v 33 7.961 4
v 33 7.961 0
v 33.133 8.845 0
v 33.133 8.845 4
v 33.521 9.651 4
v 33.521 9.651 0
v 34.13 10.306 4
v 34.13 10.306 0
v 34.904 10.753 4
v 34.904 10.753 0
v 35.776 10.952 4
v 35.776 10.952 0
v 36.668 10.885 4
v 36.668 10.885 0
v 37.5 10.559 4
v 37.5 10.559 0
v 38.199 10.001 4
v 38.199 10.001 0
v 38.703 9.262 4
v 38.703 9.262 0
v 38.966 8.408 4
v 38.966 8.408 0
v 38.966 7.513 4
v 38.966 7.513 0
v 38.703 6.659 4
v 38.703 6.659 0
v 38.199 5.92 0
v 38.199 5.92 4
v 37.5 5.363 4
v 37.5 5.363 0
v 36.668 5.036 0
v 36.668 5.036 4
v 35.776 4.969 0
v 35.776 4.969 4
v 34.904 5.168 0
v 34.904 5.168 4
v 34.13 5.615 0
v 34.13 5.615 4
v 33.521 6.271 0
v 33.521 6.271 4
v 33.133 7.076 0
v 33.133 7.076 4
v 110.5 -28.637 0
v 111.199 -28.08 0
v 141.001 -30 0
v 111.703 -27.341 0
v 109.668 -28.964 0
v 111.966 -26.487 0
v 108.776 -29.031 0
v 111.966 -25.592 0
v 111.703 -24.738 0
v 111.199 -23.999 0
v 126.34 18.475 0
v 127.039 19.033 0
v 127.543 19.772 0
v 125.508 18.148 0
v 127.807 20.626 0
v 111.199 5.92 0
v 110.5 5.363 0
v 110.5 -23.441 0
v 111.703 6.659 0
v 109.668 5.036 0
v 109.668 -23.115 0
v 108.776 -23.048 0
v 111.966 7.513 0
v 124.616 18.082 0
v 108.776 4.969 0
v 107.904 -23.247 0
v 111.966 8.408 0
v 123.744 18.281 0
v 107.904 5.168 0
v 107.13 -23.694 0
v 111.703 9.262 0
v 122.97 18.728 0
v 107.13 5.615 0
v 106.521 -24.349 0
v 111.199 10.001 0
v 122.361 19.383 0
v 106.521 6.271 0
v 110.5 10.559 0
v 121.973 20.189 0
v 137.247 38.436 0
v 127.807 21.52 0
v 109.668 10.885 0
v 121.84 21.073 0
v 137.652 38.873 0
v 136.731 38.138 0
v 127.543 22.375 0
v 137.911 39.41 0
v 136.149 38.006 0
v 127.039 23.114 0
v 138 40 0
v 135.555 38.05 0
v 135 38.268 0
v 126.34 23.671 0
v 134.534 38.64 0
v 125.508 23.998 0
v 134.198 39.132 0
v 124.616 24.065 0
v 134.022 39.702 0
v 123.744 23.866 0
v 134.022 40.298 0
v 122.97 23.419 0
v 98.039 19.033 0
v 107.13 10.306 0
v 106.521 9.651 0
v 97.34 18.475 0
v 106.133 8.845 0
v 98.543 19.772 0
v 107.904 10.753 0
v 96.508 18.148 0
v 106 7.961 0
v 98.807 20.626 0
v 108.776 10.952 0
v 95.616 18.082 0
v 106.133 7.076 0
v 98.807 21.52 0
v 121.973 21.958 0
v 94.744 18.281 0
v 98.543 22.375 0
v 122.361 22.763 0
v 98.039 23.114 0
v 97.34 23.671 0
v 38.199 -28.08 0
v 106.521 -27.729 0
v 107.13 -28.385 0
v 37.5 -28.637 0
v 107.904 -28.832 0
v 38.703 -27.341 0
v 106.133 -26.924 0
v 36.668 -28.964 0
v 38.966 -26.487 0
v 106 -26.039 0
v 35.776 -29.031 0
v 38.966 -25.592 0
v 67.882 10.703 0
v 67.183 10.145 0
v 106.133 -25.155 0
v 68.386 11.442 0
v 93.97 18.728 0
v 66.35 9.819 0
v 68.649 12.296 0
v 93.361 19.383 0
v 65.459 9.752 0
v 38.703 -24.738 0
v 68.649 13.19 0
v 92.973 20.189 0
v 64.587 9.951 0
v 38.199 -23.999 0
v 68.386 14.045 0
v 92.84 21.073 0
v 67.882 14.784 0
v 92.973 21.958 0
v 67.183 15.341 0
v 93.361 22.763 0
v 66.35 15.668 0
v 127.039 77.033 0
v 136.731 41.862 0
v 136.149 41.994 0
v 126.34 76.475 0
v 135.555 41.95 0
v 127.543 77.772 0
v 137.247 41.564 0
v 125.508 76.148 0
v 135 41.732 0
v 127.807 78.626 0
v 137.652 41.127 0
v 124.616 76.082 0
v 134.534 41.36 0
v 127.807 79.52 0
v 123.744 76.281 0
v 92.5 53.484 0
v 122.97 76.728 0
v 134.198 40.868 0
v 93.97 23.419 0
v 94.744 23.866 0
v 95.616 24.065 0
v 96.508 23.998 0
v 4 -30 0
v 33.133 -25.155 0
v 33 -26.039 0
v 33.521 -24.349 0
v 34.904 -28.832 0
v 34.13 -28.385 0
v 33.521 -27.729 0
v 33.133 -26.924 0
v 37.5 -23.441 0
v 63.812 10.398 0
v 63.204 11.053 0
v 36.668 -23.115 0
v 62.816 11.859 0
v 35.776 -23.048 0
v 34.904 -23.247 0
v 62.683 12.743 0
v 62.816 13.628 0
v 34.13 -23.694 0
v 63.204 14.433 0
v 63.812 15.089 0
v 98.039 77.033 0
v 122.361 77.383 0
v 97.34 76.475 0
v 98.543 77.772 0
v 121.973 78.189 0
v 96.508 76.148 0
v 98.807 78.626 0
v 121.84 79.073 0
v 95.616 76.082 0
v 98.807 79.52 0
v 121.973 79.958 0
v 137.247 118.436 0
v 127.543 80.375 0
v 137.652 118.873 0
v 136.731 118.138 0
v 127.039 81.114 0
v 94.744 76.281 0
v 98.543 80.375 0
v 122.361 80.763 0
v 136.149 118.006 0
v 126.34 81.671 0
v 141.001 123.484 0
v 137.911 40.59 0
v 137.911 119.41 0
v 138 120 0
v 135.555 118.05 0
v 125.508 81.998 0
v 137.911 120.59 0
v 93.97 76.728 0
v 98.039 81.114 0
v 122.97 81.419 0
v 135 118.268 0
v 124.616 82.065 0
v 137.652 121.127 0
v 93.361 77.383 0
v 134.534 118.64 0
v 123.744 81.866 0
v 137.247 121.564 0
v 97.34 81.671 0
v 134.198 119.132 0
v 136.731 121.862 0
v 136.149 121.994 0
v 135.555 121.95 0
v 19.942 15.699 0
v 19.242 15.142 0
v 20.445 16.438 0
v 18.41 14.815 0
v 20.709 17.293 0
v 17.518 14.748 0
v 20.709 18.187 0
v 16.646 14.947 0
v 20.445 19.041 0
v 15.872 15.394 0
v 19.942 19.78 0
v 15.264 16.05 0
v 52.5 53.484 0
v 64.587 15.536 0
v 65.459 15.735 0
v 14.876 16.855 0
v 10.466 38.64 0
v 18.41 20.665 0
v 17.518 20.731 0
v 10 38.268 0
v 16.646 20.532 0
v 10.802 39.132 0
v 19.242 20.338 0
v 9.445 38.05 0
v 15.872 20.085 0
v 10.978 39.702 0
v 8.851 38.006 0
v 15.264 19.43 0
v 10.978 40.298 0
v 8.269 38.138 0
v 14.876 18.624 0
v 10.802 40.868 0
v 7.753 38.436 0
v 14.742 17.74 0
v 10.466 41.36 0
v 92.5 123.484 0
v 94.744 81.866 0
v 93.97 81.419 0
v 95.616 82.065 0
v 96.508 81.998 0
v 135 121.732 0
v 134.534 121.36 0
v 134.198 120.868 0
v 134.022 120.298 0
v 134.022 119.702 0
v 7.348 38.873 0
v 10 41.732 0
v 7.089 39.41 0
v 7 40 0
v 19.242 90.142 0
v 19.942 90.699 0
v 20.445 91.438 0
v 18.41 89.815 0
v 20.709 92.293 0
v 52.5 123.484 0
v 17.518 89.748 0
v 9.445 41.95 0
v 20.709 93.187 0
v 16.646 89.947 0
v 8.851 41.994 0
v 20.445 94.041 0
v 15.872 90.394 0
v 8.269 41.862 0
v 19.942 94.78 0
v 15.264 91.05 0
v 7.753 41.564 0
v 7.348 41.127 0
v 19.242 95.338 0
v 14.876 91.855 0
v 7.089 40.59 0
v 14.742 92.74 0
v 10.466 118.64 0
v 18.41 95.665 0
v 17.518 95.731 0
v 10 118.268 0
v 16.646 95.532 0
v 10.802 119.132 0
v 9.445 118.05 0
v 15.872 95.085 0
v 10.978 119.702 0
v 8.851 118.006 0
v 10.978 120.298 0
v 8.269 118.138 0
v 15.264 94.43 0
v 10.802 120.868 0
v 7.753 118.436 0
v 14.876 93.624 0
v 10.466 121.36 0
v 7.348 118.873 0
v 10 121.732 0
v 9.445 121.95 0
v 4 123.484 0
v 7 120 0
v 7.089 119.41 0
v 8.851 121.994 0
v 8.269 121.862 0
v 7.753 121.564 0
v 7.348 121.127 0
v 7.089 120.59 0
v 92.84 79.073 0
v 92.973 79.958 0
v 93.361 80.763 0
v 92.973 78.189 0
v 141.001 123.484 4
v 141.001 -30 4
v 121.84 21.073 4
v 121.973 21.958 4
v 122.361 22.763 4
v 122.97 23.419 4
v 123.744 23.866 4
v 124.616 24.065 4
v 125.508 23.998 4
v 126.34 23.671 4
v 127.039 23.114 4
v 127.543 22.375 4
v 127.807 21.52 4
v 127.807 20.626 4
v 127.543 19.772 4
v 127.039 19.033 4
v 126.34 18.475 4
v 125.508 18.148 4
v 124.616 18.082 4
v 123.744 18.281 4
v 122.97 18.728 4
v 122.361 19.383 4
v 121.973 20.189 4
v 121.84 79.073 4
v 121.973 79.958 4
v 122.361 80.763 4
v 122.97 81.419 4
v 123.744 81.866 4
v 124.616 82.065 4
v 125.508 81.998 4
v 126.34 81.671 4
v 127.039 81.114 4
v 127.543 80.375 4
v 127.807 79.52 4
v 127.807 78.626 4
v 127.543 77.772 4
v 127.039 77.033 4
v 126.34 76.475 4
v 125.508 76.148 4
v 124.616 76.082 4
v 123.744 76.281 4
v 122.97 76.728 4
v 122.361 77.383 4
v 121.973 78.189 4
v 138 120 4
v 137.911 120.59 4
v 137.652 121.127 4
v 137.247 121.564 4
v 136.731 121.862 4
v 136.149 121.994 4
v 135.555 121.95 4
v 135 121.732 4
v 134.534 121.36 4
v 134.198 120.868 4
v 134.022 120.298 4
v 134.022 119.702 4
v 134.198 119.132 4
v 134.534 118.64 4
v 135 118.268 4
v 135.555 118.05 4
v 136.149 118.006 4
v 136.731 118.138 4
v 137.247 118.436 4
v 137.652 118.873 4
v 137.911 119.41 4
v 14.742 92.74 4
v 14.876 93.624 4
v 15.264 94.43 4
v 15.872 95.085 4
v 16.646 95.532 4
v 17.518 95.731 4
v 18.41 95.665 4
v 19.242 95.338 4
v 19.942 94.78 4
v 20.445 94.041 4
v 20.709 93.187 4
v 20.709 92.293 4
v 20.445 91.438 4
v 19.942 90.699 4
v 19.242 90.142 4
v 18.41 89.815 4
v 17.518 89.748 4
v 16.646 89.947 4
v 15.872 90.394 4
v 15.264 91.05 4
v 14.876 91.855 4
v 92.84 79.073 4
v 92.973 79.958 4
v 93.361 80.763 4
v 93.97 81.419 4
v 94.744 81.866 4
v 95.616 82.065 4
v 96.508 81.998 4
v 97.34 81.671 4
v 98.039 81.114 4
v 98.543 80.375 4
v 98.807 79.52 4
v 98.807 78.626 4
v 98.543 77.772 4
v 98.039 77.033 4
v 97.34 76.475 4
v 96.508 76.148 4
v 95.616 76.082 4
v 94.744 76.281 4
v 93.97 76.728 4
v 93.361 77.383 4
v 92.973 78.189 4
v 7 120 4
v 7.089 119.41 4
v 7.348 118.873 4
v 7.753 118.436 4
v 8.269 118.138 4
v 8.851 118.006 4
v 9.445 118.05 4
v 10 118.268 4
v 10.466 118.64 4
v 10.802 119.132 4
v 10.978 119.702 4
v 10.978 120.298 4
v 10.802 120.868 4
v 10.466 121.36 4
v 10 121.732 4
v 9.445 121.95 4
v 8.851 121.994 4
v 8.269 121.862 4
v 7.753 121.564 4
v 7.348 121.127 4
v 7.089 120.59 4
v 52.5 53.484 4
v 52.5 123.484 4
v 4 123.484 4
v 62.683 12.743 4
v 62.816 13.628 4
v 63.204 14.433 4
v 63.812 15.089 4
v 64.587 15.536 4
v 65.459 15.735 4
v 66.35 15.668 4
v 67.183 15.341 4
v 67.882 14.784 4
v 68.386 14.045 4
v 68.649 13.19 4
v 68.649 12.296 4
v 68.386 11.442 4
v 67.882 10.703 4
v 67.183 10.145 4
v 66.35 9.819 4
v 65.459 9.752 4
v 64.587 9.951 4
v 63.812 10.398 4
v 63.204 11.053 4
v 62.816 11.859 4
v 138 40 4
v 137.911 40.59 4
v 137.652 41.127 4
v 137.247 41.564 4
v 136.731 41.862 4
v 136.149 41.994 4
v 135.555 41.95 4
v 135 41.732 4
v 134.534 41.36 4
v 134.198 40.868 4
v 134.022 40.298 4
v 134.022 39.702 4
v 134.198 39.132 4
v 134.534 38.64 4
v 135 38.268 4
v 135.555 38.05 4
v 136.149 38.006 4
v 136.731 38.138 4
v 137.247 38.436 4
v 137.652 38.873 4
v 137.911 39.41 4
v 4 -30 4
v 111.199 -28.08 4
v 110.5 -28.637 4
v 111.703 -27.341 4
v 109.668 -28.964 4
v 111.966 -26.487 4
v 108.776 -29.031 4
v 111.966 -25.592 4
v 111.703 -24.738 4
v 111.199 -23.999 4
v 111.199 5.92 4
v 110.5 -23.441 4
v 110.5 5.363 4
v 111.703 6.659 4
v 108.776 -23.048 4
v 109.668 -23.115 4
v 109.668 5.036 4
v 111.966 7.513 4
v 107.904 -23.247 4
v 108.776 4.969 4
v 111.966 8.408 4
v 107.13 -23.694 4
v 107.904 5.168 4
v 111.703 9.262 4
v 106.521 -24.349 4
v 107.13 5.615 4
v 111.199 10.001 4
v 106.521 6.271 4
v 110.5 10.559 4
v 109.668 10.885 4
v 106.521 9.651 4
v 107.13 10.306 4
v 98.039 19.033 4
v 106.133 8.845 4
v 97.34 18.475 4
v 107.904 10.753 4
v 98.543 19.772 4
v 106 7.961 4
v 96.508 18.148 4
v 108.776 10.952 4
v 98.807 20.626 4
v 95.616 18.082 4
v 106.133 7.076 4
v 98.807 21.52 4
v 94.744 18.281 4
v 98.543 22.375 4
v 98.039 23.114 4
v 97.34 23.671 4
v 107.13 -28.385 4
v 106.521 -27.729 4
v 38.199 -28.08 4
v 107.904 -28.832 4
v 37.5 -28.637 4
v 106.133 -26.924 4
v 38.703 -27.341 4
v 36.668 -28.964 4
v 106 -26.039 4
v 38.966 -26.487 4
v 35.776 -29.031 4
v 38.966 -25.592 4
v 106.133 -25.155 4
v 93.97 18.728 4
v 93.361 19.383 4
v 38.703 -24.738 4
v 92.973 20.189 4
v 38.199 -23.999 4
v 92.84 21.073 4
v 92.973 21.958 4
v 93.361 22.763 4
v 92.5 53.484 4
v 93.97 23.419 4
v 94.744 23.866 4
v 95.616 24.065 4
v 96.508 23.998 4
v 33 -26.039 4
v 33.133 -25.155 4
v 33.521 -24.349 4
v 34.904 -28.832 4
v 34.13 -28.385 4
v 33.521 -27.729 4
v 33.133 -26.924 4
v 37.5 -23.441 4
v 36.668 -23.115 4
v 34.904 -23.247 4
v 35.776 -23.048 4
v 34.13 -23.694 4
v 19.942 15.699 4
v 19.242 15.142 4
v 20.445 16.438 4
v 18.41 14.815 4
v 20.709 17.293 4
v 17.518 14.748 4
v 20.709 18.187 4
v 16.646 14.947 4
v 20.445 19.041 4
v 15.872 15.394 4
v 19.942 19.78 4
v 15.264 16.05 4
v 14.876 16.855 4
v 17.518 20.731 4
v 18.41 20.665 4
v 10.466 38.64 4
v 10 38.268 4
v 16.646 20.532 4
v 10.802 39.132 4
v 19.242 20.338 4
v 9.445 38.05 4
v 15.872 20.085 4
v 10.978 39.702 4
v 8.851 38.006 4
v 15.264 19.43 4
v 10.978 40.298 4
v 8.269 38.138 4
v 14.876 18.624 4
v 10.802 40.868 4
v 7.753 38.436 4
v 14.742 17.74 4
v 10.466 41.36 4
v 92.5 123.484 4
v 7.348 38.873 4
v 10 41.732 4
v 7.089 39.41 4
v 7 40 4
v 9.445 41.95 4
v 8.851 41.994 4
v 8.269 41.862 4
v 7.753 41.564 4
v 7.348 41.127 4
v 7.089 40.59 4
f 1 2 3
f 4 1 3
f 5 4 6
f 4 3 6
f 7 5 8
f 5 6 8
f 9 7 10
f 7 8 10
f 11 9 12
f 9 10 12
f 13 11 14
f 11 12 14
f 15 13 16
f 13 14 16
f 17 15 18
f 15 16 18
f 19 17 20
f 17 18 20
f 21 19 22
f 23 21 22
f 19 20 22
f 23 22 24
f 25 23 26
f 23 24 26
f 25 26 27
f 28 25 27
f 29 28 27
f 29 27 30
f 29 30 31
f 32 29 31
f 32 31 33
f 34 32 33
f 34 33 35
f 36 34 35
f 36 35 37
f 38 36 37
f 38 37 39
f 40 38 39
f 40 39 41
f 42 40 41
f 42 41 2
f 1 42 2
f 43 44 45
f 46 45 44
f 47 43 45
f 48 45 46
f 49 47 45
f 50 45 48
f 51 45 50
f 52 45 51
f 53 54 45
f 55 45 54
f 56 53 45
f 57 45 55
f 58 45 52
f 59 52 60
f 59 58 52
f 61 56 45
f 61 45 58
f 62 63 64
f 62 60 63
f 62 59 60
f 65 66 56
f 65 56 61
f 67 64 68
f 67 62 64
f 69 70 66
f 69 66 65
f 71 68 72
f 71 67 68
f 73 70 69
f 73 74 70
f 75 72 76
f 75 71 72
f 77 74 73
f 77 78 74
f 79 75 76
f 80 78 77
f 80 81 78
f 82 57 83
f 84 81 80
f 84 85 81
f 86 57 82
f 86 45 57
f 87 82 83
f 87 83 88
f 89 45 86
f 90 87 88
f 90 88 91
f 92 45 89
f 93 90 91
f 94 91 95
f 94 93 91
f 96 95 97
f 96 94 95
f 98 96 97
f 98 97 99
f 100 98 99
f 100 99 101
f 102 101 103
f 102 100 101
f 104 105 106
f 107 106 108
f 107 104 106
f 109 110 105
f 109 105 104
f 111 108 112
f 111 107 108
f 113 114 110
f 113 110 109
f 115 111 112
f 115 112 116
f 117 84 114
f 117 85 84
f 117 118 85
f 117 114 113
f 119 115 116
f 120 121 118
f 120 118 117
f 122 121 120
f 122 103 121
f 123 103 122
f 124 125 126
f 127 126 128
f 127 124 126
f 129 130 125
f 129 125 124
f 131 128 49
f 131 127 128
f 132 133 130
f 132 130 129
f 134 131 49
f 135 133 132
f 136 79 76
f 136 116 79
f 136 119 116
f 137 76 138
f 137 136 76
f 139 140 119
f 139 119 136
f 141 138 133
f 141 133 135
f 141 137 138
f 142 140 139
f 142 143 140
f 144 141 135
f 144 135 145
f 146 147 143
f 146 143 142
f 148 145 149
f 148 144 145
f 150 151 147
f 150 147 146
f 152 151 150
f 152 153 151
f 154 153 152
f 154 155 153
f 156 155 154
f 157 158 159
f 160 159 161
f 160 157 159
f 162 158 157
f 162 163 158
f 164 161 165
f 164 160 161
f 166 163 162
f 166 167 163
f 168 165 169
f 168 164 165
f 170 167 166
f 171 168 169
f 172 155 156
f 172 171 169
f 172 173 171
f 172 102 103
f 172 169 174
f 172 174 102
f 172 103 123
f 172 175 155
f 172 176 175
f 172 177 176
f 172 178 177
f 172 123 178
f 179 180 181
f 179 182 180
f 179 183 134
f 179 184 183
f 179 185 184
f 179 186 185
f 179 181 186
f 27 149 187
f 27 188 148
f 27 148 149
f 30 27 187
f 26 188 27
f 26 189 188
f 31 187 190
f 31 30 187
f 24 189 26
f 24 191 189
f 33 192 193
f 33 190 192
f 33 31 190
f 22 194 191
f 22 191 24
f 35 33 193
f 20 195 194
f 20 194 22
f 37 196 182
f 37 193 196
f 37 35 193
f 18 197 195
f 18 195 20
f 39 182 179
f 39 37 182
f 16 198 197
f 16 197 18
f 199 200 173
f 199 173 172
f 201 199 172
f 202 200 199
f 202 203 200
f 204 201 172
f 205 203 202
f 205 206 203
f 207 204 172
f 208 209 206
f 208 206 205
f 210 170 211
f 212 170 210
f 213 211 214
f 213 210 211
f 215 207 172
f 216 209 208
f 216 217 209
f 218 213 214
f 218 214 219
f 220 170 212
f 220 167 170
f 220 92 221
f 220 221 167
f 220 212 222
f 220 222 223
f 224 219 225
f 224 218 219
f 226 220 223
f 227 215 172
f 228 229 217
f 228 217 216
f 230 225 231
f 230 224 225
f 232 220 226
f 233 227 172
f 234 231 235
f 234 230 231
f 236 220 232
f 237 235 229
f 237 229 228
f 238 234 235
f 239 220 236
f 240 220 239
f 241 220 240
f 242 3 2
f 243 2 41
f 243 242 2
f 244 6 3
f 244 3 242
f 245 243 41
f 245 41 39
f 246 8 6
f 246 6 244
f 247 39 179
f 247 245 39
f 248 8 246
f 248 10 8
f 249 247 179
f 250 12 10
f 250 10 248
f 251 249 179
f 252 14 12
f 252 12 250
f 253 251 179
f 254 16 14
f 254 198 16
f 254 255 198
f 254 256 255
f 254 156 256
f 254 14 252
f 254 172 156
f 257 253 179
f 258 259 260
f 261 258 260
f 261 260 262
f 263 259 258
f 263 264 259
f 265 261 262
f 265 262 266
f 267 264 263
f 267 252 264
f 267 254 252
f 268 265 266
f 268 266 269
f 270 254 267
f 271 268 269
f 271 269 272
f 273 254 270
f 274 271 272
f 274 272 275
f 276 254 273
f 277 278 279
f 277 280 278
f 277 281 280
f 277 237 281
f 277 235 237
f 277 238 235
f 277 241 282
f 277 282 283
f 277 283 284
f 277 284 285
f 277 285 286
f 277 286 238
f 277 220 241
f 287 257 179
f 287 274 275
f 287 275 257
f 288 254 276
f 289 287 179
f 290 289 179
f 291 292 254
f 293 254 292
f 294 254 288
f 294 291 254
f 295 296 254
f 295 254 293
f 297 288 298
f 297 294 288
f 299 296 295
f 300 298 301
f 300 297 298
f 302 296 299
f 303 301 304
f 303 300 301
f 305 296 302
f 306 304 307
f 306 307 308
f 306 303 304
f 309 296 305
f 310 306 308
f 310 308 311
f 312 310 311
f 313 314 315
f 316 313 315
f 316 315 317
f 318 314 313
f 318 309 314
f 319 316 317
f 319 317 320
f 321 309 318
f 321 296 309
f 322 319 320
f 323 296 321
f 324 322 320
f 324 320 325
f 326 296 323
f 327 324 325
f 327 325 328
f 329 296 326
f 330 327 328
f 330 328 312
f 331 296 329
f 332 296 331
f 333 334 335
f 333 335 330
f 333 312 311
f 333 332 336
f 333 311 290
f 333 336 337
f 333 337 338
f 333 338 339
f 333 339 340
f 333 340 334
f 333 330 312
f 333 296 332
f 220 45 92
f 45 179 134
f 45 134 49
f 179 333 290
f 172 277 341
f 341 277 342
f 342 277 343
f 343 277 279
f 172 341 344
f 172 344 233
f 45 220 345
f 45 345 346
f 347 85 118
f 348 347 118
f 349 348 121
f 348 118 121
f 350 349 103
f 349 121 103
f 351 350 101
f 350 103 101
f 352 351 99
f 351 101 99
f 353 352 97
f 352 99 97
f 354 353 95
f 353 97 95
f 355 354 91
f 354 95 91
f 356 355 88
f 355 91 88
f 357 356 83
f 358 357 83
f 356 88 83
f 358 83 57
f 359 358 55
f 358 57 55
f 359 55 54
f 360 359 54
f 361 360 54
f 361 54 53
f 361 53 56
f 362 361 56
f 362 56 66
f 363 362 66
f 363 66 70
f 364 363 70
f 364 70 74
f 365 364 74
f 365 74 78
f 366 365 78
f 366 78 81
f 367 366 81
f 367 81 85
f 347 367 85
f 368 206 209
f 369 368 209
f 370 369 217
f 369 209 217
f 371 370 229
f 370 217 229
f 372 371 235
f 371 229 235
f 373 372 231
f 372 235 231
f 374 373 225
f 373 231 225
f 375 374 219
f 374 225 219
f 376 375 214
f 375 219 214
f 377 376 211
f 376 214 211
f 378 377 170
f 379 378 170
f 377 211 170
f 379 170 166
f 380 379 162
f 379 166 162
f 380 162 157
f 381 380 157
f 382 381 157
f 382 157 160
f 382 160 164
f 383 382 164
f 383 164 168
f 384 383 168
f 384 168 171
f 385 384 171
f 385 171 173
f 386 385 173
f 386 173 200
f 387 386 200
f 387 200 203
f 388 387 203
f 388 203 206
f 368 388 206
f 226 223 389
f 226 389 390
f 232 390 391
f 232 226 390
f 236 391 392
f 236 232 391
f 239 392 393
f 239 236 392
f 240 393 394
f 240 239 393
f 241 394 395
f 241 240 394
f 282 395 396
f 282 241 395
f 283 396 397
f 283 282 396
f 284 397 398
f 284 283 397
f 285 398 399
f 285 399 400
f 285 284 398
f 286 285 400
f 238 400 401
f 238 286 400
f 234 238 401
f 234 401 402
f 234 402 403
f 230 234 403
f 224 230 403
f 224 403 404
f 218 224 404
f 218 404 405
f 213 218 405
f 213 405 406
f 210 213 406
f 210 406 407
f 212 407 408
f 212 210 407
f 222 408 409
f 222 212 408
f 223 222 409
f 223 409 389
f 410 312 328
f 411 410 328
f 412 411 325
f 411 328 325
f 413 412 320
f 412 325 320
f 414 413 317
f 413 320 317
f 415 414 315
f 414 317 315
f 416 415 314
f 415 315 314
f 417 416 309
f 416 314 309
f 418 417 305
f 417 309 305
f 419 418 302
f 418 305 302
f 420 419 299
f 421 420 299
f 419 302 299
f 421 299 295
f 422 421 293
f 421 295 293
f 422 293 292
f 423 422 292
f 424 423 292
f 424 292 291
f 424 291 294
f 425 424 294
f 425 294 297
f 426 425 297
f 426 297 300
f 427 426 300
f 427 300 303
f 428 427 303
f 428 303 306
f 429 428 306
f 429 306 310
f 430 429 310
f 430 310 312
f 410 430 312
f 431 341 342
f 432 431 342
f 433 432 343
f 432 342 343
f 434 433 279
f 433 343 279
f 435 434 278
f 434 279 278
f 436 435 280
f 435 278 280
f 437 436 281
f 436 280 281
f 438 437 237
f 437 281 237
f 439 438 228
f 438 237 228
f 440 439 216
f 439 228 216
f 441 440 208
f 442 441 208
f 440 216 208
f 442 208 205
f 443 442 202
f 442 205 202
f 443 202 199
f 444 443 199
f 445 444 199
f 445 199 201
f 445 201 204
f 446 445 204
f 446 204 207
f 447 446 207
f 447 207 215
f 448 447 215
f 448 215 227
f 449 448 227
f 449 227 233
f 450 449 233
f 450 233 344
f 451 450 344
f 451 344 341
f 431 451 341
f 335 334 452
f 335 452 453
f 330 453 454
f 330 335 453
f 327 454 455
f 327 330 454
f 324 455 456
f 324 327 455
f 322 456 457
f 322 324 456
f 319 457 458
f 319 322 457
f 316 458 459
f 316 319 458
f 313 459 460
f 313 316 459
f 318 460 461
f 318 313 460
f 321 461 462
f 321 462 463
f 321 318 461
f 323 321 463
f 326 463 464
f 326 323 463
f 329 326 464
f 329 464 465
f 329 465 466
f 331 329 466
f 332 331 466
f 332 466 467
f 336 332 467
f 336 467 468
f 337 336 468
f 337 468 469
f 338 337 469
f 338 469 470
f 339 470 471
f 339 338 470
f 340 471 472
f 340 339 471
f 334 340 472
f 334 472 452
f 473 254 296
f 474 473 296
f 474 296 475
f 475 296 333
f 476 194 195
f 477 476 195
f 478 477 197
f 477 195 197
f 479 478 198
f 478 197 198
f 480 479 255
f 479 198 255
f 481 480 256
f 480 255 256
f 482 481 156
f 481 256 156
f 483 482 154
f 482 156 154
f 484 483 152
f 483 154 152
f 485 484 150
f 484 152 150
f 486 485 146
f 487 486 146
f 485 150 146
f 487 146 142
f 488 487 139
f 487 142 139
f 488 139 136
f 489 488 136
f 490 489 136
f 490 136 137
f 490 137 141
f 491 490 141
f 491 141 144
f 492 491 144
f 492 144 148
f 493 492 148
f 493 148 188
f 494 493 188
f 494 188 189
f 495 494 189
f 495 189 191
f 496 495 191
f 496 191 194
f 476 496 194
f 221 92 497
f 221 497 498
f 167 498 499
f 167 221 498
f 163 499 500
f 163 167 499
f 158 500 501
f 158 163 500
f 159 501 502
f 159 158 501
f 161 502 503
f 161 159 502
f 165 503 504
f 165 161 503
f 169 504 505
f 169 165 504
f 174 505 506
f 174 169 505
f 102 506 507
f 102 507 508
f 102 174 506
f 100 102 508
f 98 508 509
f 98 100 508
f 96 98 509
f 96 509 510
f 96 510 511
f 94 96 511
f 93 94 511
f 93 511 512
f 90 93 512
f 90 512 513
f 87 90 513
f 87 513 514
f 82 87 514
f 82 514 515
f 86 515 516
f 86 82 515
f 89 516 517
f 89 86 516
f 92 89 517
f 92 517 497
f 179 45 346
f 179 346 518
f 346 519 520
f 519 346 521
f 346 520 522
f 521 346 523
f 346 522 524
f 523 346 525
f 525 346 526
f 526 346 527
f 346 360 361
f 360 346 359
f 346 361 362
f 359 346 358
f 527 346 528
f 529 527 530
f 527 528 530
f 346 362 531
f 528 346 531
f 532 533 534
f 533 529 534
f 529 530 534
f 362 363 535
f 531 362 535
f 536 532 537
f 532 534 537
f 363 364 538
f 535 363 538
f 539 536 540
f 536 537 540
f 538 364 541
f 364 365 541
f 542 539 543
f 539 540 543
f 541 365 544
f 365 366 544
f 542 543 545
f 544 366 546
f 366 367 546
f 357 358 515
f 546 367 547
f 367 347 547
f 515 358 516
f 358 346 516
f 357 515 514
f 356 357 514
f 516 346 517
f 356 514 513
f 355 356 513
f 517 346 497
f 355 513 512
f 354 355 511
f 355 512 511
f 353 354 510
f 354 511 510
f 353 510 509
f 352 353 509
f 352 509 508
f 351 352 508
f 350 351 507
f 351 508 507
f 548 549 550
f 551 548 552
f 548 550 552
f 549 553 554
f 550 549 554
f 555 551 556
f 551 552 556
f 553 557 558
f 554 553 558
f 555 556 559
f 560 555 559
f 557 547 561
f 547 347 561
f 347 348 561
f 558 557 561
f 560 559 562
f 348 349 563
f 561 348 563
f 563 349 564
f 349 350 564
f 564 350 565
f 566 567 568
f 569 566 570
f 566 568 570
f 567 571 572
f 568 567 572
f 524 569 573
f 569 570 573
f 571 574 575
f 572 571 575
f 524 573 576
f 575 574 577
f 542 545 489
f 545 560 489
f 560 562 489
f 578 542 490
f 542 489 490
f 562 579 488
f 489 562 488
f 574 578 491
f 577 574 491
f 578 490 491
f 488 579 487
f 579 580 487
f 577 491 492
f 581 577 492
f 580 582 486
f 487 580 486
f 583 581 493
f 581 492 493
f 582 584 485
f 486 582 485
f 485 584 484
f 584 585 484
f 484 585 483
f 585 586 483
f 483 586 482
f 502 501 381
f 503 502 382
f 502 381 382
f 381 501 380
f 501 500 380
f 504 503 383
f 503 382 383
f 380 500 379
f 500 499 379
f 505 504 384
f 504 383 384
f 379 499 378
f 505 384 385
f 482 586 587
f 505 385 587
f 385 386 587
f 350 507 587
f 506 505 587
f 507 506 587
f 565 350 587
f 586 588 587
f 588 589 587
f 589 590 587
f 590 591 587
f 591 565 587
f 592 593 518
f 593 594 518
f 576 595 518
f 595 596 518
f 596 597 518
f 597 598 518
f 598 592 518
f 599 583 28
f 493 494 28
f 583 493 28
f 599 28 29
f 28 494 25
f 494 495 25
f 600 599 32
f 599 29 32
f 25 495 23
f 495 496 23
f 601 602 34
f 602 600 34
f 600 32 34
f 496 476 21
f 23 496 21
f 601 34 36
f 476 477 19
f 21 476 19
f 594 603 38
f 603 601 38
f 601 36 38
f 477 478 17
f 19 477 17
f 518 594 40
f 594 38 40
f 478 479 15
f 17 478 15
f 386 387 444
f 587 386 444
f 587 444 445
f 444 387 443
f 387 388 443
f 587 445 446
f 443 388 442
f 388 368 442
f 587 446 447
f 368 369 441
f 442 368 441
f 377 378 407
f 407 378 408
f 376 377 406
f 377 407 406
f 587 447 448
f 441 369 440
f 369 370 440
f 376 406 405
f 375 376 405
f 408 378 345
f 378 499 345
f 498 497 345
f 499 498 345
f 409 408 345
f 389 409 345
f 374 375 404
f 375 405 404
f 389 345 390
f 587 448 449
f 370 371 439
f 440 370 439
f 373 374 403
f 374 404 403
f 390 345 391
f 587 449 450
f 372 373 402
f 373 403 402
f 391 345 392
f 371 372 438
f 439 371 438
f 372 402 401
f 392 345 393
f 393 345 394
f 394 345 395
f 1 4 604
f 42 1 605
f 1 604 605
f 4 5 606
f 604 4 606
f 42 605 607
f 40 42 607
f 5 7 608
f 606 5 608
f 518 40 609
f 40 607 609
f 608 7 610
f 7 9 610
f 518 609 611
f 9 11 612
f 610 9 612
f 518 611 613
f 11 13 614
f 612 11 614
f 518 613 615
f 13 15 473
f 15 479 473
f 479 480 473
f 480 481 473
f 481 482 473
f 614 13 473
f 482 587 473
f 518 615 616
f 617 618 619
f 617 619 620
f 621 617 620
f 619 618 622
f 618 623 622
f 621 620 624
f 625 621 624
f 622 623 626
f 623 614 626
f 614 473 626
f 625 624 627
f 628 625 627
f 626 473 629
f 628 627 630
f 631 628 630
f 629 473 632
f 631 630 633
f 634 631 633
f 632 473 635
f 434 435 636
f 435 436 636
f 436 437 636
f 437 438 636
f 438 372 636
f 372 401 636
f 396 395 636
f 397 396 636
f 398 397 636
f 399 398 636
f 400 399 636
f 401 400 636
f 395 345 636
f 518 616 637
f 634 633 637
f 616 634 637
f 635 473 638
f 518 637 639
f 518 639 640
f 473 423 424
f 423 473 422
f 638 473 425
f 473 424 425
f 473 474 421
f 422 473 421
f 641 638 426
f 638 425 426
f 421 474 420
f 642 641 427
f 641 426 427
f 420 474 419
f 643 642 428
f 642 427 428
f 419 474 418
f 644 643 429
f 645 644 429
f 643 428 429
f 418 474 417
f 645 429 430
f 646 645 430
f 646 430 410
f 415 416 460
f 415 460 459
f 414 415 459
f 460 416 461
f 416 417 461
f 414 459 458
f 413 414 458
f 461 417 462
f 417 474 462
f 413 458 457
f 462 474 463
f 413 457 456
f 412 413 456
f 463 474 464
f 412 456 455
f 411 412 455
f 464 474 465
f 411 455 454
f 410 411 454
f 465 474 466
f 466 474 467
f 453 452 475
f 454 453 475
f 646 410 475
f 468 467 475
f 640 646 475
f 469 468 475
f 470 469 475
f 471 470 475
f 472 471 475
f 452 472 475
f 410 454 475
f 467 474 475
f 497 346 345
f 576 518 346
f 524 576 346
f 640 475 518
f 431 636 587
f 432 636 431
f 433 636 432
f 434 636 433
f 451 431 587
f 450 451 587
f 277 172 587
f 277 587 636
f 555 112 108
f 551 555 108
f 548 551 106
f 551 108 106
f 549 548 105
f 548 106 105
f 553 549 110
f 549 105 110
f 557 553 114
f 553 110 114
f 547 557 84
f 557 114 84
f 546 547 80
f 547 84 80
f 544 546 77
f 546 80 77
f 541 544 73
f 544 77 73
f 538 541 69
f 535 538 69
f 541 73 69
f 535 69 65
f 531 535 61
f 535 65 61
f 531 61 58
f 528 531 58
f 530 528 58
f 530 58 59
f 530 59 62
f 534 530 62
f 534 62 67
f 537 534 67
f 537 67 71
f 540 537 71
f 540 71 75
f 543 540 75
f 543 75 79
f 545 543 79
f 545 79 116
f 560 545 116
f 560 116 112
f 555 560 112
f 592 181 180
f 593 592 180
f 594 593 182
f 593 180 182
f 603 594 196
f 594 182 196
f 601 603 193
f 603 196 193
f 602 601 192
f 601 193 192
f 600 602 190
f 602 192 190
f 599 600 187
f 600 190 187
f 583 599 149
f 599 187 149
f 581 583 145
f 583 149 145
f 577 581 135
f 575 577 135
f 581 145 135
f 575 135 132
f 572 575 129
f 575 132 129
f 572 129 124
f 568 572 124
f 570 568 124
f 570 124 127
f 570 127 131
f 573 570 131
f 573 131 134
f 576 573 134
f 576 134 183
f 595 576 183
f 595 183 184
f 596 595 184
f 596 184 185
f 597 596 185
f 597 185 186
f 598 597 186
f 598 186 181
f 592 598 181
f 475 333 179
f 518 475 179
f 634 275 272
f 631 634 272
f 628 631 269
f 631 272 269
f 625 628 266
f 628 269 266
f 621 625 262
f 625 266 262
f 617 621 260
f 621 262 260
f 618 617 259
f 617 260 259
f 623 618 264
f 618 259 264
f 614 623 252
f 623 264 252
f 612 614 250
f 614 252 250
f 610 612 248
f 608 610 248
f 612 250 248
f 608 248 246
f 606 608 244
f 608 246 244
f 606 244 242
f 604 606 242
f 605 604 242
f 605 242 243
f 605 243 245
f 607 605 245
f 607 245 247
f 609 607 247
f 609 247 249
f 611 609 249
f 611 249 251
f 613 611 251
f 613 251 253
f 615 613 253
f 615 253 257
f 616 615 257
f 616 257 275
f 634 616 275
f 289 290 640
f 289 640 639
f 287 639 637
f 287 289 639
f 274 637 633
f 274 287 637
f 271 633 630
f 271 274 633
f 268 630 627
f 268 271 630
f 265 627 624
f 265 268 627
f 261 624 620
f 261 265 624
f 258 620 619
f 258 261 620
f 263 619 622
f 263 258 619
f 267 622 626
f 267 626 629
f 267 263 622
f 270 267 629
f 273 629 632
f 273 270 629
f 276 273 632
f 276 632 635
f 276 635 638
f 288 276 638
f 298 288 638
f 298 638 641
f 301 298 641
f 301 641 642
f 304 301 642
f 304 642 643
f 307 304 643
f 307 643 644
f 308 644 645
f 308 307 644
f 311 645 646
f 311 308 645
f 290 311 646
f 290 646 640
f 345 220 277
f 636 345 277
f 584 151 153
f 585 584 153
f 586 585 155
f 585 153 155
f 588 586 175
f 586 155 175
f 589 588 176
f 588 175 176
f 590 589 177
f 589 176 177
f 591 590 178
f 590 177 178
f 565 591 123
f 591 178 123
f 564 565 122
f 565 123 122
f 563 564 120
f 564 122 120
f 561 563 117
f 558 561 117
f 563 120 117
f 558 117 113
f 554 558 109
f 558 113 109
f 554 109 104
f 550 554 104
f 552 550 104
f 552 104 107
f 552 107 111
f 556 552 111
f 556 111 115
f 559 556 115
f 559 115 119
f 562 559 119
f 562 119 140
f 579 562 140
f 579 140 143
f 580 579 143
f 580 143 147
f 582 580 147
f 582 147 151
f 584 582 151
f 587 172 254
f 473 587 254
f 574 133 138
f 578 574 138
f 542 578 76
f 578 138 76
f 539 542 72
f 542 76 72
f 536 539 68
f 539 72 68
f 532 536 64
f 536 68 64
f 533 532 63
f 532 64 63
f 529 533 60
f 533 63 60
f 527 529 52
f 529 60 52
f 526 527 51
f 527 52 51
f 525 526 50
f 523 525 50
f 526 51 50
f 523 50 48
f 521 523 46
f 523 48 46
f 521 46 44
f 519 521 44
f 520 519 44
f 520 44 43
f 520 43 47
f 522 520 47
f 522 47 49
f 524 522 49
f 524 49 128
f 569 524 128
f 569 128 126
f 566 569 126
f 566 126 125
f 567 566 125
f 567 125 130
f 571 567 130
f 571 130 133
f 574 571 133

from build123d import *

# Parameters (mm, degrees)
SKETCH_1_R          = 2
EXTRUDE_1_DEPTH     = 4
SKETCH_2_R          = 2
CUT_EXTRUDE_1_DEPTH = 26
EXTRUDE_3_DEPTH     = 4
FILLET_1_R          = 4
FILLET_2_R          = 4
SKETCH_5_W          = 10
SKETCH_5_H          = 14
EXTRUDE_4_DEPTH     = 4
FILLET_3_R          = 4
FILLET_1_2_DEPTH    = 4
CUT_EXTRUDE_2_DEPTH = 10
SKETCH_7_R          = 3
CUT_EXTRUDE_3_DEPTH = 10
CUT_EXTRUDE_4_DEPTH = 10
SKETCH_9_W          = 20
SKETCH_9_H          = 70
SKETCH_9_R          = 3
CUT_EXTRUDE_5_DEPTH = 10
CUT_EXTRUDE_6_DEPTH = 10


with BuildPart() as part:
    # 草图1 → 凸台-拉伸1 (new body)
    with BuildSketch(Plane.XY):
        with BuildLine():
            Line((0, -30), (0, 87))
            Line((0, 87), (-8, 87))
            Line((-8, 87), (-8, 95))
            Line((-8, 95), (0, 95))
            Line((0, 95), (0, 155))
            Line((0, 155), (-20, 155))
            Line((-20, 155), (-20, 180))
            Line((-20, 180), (-8, 180))
            ThreePointArc((-8, 180), (-0.928932188, 182.928932188), (2, 190))
            Line((2, 190), (2, 212))
            Line((2, 212), (10, 212))
            Line((10, 212), (10, 190))
            ThreePointArc((10, 190), (12.928932188, 182.928932188), (20, 180))
            Line((20, 180), (72.5, 180))
            Line((72.5, 180), (125, 180))
            ThreePointArc((125, 180), (132.071067812, 182.928932188), (135, 190))
            Line((135, 190), (135, 212))
            Line((135, 212), (143, 212))
            Line((143, 212), (143, 190))
            ThreePointArc((143, 190), (145.928932188, 182.928932188), (153, 180))
            Line((153, 180), (165, 180))
            Line((165, 180), (165, 155))
            Line((165, 155), (145, 155))
            Line((145, 155), (145, 95))
            Line((145, 95), (153, 95))
            Line((153, 95), (153, 87))
            Line((153, 87), (145, 87))
            Line((145, 87), (145, -30))
            Line((145, -30), (0, -30))
        make_face()
        with Locations((139, 208)):
            Circle(SKETCH_1_R, mode=Mode.SUBTRACT)
        with Locations(Location((149, 91, 0), (0, 0, 180))):
            Circle(SKETCH_1_R, mode=Mode.SUBTRACT)
        with Locations(Location((9, 40, 0), (0, 0, 180))):
            Circle(SKETCH_1_R, mode=Mode.SUBTRACT)
        with Locations(Location((9, 120, 0), (0, 0, 180))):
            Circle(SKETCH_1_R, mode=Mode.SUBTRACT)
        with Locations((-4, 91)):
            Circle(SKETCH_1_R, mode=Mode.SUBTRACT)
        with Locations(Location((6, 208, 0), (0, 0, 180))):
            Circle(SKETCH_1_R, mode=Mode.SUBTRACT)
        with Locations((136, 120)):
            Circle(SKETCH_1_R, mode=Mode.SUBTRACT)
        with Locations((136, 40)):
            Circle(SKETCH_1_R, mode=Mode.SUBTRACT)
    extrude(amount=EXTRUDE_1_DEPTH)

    # 草图2 → 切除-拉伸1 (cut)
    with BuildSketch(Plane(origin=(0, 0, 0), x_dir=(-1, 0, 0), z_dir=(0, 0, -1))):
        with Locations((-90.5, 176)):
            Circle(SKETCH_2_R)
        with Locations((-82.5, 176)):
            Circle(SKETCH_2_R)
        with Locations((-62.5, 176)):
            Circle(SKETCH_2_R)
        with Locations((-54.5, 176)):
            Circle(SKETCH_2_R)
    extrude(amount=-CUT_EXTRUDE_1_DEPTH, mode=Mode.SUBTRACT)

    # 草图4 → 凸台-拉伸3 (add)
    with BuildSketch(Plane(origin=(0, 0, 0), x_dir=(-1, 0, 0), z_dir=(0, 0, -1))):
        with BuildLine():
            Line((-102.5, 194), (-102.5, 204.972470671))
            Line((-102.5, 204.972470671), (-99, 215.944941341))
            Line((-99, 215.944941341), (-95.5, 215.944941341))
            ThreePointArc((-95.5, 215.944941341), (-92.121980777, 211.957020041), (-89.03099134, 207.742721229))
            ThreePointArc((-89.03099134, 207.742721229), (-72.5, 199), (-55.96900866, 207.742721229))
            ThreePointArc((-55.96900866, 207.742721229), (-52.878019223, 211.957020041), (-49.5, 215.944941341))
            Line((-49.5, 215.944941341), (-46, 215.944941341))
            Line((-46, 215.944941341), (-42.5, 204.972470671))
            Line((-42.5, 204.972470671), (-42.5, 194))
            Line((-42.5, 194), (-42.5, 180))
            Line((-42.5, 180), (-49.5, 180))
            Line((-49.5, 180), (-49.5, 194))
            Line((-49.5, 194), (-95.5, 194))
            Line((-95.5, 194), (-95.5, 180))
            Line((-95.5, 180), (-102.5, 180))
            Line((-102.5, 180), (-102.5, 194))
        make_face()
    extrude(amount=-EXTRUDE_3_DEPTH)

    # Fillet 1
    fillet_1_edges = [part.edges().sort_by_distance(p)[0] for p in [
        (102.5, 180, 2),
    ]]
    fillet(fillet_1_edges, radius=FILLET_1_R)

    # 圆角2
    fillet_2_edges = [part.edges().sort_by_distance(p)[0] for p in [
        (42.5, 180, 2),
    ]]
    fillet(fillet_2_edges, radius=FILLET_2_R)

    # 草图5 → 凸台-拉伸4 (add)
    with BuildSketch(Plane(origin=(0, 0, 0), x_dir=(-1, 0, 0), z_dir=(0, 0, -1))):
        with Locations((-71.485667886, 187)):
            Rectangle(SKETCH_5_W, SKETCH_5_H)
    extrude(amount=-EXTRUDE_4_DEPTH)

    # 圆角3
    fillet_3_edges = [part.edges().sort_by_distance(p)[0] for p in [
        (0, 95, 2),
    ]]
    fillet(fillet_3_edges, radius=FILLET_3_R)

    # Fillet 1 2: read off the stored shape, not the designer's step
    # Fillet 1 2 outline → Fillet 1 2 (add)
    with BuildSketch(Plane.XY):
        with BuildLine():
            add(Edge.make_bspline(
                [(0, 85), (0, 87), (-2, 87)],
                knots=[0, 0, 0, 1, 1, 1], degree=2, weights=[1, 0.707106781, 1]))
            Line((0, 85), (0, 87))
            Line((0, 87), (-2, 87))
        make_face()
        with BuildLine():
            add(Edge.make_bspline(
                [(145, 97), (145, 95), (147, 95)],
                knots=[0, 0, 0, 1, 1, 1], degree=2, weights=[1, 0.707106781, 1]))
            Line((145, 97), (145, 95))
            Line((145, 95), (147, 95))
        make_face()
        with BuildLine():
            add(Edge.make_bspline(
                [(147, 87), (145, 87), (145, 85)],
                knots=[0, 0, 0, 1, 1, 1], degree=2, weights=[1, 0.707106781, 1]))
            Line((147, 87), (145, 87))
            Line((145, 87), (145, 85))
        make_face()
    extrude(amount=FILLET_1_2_DEPTH)

    # 草图6 → 切除-拉伸2 (cut)
    with BuildSketch(Plane(origin=(0, 0, 0), x_dir=(-1, 0, 0), z_dir=(0, 0, -1))):
        with BuildLine():
            Line((-145, 126), (0, 127))
            ThreePointArc((0, 127), (86.5779564, 788.380122484), (-240.522742442, 207.067348009))
            Line((-240.522742442, 207.067348009), (-145, 126))
        make_face()
        Polygon((-145, 97), (-145, 85), (-184.843069779, 78.009614434), (-187.688323439, 115.332647741), align=None)
        Polygon((0, 85), (0, 99), (22.414932697, 115.332647741), (70.043948421, 78.009614434), align=None)
    extrude(amount=-CUT_EXTRUDE_2_DEPTH, mode=Mode.SUBTRACT)

    # 草图7 → 切除-拉伸3 (cut)
    with BuildSketch(Plane(origin=(0, 0, 0), x_dir=(-1, 0, 0), z_dir=(0, 0, -1))):
        with Locations((-109, 7.960589548)):
            Circle(SKETCH_7_R)
        with Locations((-36, 7.960589548)):
            Circle(SKETCH_7_R)
        with Locations((-109, -26.039410452)):
            Circle(SKETCH_7_R)
        with Locations((-36, -26.039410452)):
            Circle(SKETCH_7_R)
        with Locations((-124.840103492, 79.073280951)):
            Circle(SKETCH_7_R)
        with Locations((-124.840103492, 21.073280951)):
            Circle(SKETCH_7_R)
        with Locations((-95.840103492, 21.073280951)):
            Circle(SKETCH_7_R)
        with Locations((-95.840103492, 79.073280951)):
            Circle(SKETCH_7_R)
        with Locations((-65.68273437, 95.743302343)):
            Circle(SKETCH_7_R)
        with Locations((-65.68273437, 12.743302343)):
            Circle(SKETCH_7_R)
        with Locations((-17.742400545, 17.739740347)):
            Circle(SKETCH_7_R)
        with Locations((-17.742400545, 92.739740347)):
            Circle(SKETCH_7_R)
    extrude(amount=-CUT_EXTRUDE_3_DEPTH, mode=Mode.SUBTRACT)

    # 草图8 → 切除-拉伸4 (cut)
    with BuildSketch(Plane(origin=(0, 0, 0), x_dir=(-1, 0, 0), z_dir=(0, 0, -1))):
        Polygon((-154.568758674, 123.48356313), (9.260166048, 123.48356313), (22.383573851, 133.739706362), (-120.787265427, 138.710916059), align=None)
    extrude(amount=-CUT_EXTRUDE_4_DEPTH, mode=Mode.SUBTRACT)

    # 草图9 → 切除-拉伸5 (cut)
    # profile 1 of 2: a face of its own
    with BuildSketch(Plane(origin=(0, 0, 0), x_dir=(-1, 0, 0), z_dir=(0, 0, -1))):
        with Locations((-82.5, 88.48356313)):
            Rectangle(SKETCH_9_W, SKETCH_9_H)
    # profile 2 of 2: a face of its own
    with BuildSketch(Plane(origin=(0, 0, 0), x_dir=(-1, 0, 0), z_dir=(0, 0, -1))):
        with Locations((-62.5, 88.48356313)):
            Rectangle(SKETCH_9_W, SKETCH_9_H)
        with Locations((-65.68273437, 95.743302343)):
            Circle(SKETCH_9_R, mode=Mode.SUBTRACT)
    extrude(amount=-CUT_EXTRUDE_5_DEPTH, mode=Mode.SUBTRACT)

    # 草图10 → 切除-拉伸6 (cut)
    with BuildSketch(Plane(origin=(0, 0, 0), x_dir=(-1, 0, 0), z_dir=(0, 0, -1))):
        Polygon((-141.001388933, 153.448037881), (-141.001388933, -56.355097375), (-194.104207941, 53.872664694), align=None)
        Polygon((-4, 153.448037881), (-4, -50.760982065), (2.911690677, -47.431237796), (83.451298672, 119.6813615), align=None)
    extrude(amount=-CUT_EXTRUDE_6_DEPTH, mode=Mode.SUBTRACT)


solid = part.part
